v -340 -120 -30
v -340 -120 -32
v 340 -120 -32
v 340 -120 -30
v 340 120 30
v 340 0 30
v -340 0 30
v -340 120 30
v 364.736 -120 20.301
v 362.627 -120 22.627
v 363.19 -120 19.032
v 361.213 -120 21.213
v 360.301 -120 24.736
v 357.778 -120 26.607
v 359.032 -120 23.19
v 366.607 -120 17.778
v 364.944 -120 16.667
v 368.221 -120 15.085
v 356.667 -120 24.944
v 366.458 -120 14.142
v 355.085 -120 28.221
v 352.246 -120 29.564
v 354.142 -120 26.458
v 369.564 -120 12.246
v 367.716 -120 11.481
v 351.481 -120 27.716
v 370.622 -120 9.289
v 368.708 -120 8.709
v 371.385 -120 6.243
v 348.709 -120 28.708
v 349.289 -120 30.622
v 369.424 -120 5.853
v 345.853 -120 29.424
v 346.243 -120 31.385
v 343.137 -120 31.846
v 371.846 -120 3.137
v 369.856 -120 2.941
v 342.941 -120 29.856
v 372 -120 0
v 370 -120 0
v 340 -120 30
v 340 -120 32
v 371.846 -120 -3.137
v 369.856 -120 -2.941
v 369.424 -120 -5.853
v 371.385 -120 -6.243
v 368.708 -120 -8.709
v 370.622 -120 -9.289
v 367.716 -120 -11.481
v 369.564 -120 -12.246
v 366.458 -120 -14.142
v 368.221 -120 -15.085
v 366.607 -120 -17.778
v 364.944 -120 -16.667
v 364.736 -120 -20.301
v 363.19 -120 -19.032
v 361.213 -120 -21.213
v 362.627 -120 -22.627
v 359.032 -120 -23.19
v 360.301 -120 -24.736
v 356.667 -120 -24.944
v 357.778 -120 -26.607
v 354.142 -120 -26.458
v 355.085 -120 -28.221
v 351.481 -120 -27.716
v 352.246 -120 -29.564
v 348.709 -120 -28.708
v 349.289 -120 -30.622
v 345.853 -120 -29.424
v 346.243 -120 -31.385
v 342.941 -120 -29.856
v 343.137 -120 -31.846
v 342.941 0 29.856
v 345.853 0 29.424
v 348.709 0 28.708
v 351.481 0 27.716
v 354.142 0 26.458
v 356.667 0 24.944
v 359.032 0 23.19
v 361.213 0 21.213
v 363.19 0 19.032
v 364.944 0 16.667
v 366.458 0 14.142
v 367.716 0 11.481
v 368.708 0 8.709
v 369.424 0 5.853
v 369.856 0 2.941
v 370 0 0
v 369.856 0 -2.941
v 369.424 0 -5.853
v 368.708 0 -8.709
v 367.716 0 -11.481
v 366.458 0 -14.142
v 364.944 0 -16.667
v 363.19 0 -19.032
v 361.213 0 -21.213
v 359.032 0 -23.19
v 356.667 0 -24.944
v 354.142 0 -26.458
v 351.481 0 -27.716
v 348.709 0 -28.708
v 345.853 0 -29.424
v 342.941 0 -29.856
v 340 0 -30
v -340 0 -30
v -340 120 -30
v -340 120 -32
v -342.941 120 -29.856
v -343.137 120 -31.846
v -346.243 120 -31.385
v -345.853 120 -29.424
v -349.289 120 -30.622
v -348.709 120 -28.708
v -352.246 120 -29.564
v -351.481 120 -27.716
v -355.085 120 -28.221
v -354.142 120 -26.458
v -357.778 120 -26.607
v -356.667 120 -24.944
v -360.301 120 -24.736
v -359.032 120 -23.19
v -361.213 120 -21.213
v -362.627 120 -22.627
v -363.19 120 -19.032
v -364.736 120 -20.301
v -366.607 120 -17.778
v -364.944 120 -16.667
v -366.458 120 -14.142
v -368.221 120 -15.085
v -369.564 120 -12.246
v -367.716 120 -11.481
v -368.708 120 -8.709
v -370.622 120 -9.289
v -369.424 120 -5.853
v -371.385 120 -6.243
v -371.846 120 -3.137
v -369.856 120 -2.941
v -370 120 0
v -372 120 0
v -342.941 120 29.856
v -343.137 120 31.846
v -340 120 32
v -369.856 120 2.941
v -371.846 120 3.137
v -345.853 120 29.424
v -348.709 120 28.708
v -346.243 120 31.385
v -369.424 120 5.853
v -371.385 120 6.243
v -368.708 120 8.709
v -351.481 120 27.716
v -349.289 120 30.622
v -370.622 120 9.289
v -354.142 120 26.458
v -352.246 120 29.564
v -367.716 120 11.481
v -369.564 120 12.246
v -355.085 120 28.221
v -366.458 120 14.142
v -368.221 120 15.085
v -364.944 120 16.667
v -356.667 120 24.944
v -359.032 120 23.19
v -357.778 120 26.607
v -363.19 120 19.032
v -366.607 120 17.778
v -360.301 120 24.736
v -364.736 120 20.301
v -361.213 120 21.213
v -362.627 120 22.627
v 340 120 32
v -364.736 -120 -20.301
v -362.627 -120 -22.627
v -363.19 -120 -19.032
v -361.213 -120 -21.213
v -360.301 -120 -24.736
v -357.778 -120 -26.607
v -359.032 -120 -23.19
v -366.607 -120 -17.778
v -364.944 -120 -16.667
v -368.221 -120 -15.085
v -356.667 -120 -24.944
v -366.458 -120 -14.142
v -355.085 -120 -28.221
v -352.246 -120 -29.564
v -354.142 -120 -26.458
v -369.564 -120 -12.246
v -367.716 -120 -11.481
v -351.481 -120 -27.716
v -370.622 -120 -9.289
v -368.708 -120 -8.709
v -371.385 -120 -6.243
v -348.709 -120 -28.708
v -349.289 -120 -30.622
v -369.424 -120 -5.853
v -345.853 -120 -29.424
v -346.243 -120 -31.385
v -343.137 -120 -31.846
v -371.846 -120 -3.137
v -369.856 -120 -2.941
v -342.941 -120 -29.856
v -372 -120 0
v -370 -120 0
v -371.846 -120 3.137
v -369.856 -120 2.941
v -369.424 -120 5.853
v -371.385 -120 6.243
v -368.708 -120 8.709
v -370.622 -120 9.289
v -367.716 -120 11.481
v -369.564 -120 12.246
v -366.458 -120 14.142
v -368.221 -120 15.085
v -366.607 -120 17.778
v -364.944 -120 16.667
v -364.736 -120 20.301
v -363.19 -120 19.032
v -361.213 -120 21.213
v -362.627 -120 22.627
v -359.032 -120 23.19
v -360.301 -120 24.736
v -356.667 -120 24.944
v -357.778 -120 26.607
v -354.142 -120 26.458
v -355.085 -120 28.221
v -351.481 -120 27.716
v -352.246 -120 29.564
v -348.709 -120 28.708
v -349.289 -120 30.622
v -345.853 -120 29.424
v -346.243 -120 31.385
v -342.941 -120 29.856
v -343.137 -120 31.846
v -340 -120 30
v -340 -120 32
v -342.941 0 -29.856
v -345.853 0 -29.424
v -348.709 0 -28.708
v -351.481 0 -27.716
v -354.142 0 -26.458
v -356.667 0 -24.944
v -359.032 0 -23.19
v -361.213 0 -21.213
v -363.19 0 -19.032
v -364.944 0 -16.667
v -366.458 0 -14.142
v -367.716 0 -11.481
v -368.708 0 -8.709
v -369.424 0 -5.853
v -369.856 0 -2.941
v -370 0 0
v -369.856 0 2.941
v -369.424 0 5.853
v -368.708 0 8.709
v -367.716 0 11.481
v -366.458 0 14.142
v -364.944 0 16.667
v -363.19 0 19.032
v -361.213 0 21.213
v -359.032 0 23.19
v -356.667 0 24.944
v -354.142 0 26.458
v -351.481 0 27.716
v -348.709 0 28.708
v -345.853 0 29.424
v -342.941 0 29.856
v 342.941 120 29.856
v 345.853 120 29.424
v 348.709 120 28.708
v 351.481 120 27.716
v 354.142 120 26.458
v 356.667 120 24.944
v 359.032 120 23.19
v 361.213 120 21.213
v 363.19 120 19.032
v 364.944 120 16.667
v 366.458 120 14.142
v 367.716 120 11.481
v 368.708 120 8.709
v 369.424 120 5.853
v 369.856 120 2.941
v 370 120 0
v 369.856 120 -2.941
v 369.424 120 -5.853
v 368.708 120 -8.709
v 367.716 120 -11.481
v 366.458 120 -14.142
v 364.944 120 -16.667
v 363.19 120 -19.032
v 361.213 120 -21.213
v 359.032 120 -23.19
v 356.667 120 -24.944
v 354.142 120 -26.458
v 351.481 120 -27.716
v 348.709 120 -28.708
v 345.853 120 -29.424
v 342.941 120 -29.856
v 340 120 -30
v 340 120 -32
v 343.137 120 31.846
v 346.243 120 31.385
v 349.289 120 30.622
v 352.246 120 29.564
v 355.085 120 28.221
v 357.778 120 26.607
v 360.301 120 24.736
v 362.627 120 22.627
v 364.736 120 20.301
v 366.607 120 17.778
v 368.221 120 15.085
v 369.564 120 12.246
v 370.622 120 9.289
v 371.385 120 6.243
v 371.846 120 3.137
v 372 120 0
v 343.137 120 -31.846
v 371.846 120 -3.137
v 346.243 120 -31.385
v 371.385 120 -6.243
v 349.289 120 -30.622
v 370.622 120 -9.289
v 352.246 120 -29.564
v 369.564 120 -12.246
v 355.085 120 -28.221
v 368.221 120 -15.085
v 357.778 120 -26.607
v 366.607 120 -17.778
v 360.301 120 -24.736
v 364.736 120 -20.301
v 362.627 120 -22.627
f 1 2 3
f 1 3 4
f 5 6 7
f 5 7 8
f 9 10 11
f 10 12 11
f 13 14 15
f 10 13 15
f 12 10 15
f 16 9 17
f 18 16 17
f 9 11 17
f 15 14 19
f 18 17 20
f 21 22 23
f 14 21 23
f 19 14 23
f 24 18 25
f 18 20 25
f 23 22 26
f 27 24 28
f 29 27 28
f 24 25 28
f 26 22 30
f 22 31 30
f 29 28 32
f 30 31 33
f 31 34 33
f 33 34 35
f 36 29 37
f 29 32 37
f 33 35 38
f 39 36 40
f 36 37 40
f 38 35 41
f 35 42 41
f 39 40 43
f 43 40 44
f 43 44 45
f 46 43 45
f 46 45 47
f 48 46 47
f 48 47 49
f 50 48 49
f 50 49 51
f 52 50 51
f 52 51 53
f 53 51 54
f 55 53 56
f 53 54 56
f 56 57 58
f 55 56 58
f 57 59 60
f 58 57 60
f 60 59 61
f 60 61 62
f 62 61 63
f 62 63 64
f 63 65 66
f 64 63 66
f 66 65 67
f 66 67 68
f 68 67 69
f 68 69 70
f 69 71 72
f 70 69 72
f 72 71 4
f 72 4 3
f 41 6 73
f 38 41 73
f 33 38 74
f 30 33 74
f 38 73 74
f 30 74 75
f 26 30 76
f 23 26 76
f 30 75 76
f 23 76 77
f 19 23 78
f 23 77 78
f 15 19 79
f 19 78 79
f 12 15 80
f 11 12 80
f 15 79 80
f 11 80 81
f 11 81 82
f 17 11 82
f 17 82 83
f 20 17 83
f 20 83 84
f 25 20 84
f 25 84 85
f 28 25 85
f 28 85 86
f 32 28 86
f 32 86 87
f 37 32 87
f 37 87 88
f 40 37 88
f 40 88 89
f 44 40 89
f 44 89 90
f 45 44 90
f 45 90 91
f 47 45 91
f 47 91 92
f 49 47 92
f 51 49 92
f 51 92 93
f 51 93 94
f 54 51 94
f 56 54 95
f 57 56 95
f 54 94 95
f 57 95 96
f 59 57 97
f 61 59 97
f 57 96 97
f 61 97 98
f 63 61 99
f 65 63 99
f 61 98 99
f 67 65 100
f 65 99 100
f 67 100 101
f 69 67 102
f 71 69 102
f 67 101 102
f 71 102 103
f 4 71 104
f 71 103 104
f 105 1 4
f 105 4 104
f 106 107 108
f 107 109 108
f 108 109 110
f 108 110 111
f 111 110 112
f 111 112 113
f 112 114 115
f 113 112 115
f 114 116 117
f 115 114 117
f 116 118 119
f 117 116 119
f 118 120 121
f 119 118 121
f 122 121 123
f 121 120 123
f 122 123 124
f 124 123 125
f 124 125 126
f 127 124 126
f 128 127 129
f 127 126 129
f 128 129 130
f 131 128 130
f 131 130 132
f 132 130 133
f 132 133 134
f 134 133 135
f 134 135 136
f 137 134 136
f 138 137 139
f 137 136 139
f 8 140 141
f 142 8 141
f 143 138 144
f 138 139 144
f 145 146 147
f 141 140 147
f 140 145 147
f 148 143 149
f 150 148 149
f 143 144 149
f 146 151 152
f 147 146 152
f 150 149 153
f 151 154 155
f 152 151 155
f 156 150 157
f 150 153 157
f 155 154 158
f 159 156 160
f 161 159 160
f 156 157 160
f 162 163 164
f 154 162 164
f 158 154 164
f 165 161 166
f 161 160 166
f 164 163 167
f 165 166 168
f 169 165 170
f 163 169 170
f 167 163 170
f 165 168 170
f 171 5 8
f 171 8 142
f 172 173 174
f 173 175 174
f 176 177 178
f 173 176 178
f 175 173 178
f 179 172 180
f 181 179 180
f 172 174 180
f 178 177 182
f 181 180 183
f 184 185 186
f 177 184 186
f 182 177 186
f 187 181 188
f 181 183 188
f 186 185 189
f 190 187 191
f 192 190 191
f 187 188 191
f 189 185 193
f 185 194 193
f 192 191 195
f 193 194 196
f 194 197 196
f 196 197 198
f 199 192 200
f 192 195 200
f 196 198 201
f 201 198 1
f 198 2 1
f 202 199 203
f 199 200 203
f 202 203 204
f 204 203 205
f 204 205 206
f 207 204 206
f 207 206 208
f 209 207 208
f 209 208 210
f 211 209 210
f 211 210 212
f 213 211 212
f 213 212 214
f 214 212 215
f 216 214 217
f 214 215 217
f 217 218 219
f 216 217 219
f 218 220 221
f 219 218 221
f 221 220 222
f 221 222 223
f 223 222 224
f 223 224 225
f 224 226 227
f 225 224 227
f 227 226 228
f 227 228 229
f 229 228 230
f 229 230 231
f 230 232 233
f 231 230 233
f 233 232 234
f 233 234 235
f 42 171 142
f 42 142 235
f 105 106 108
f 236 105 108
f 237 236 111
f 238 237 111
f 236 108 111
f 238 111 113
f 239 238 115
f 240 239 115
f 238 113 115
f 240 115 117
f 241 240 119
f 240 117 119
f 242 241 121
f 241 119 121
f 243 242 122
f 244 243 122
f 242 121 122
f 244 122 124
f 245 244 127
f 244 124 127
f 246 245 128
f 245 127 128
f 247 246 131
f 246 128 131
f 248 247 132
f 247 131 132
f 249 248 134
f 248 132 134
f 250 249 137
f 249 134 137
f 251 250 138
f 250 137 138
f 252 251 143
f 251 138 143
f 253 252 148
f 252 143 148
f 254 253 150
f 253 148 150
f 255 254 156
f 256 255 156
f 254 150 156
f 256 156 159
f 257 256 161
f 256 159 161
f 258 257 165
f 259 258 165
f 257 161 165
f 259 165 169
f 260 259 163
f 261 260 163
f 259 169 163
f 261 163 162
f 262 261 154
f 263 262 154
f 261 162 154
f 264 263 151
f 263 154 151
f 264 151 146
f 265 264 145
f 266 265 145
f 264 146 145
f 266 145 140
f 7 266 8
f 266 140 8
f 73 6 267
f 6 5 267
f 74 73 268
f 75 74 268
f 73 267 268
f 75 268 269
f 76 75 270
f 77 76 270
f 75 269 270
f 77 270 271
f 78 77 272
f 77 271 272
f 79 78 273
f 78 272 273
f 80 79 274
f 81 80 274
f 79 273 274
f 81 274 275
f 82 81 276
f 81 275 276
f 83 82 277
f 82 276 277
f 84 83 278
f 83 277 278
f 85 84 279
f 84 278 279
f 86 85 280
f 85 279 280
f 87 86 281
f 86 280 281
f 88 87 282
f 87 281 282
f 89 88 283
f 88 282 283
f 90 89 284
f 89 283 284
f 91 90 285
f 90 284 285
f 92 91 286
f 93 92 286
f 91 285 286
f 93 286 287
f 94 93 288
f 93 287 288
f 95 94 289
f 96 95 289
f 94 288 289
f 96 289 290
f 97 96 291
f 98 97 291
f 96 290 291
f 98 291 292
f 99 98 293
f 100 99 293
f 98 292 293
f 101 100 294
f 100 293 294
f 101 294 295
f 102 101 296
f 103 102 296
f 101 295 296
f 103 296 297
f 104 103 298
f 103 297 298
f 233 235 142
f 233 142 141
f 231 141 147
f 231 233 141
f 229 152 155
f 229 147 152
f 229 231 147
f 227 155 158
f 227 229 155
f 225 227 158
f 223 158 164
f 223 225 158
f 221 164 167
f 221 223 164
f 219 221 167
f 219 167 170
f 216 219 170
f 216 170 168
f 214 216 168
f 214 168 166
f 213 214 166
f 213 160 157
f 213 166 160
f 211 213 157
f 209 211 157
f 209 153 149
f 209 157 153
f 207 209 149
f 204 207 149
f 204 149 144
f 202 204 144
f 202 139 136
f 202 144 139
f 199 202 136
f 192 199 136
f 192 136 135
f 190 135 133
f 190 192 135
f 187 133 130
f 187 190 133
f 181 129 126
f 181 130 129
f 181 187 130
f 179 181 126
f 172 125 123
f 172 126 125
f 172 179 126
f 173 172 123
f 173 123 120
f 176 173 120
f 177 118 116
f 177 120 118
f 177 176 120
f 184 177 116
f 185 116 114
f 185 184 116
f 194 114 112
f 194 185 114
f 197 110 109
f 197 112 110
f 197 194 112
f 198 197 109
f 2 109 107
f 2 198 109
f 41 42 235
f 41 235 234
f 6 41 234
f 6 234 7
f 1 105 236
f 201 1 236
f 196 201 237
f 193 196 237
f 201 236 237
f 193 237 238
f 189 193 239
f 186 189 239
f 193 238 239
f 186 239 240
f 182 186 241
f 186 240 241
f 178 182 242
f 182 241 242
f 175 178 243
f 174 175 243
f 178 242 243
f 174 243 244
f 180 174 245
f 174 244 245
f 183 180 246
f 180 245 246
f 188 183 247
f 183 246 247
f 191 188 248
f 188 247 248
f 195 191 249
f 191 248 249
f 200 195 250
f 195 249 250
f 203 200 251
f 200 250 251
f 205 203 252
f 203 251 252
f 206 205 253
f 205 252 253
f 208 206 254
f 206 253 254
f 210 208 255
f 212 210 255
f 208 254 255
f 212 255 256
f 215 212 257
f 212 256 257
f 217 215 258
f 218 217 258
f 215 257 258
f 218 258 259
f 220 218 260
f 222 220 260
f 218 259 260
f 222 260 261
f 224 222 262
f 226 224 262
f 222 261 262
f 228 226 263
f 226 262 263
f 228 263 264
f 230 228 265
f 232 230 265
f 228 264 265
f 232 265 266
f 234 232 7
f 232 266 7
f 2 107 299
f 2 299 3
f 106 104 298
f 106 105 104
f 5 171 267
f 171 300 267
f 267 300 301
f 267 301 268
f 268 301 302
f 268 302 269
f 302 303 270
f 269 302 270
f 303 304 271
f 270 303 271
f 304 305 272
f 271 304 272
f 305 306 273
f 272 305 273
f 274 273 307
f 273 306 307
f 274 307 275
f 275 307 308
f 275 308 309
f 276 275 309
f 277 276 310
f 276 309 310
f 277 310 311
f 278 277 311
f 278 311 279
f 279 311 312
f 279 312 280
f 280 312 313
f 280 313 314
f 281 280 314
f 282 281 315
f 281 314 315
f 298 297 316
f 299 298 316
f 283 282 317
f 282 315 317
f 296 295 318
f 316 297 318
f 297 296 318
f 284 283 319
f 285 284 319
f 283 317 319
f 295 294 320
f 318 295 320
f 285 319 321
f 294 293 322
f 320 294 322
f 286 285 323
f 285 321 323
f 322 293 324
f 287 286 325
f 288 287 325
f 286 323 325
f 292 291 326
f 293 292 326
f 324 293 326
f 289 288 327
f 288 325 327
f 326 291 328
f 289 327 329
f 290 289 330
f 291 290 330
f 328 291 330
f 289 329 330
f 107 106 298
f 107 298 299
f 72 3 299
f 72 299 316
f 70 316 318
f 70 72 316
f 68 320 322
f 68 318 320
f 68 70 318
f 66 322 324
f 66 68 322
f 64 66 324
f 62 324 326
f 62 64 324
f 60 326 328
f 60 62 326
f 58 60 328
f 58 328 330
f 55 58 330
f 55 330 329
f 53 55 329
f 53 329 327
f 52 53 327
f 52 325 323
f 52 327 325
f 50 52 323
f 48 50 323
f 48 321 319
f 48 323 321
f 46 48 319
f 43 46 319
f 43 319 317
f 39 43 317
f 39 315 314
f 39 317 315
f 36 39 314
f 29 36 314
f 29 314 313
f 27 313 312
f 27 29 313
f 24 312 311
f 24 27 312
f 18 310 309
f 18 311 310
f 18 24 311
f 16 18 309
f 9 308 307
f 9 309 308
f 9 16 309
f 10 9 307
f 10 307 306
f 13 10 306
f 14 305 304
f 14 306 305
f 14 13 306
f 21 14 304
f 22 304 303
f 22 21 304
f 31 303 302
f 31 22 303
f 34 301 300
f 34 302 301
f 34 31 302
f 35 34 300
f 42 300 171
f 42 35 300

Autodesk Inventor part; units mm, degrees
ref_plane "YZ Plane" through (0, 0, 0) normal (1, 0, 0) x (0, 1, 0)
ref_plane "XZ Plane" through (0, 0, 0) normal (0, 1, 0) x (-1, 0, 0)
sketch "Sketch1" plane through (0, 0, 0) normal (0, 1, 0) x (-1, 0, 0)
  line L0 (370, 0) -> (-370, 0) construction
  line L1 (340, 30) -> (-340, 30)
  line L2 (-340, -30) -> (340, -30)
  arc A0 (340, -30) -> (340, 30) centre (340, 0) ccw
  arc A1 (-340, 30) -> (-340, -30) centre (-340, 0) ccw
  point P0 (0, 0)
  point P1 (0, 0)
  point P2 (-370, 0)
  point P3 (370, 0)
  dimension "d2" = 60
  dimension "d7" = 680
ref_plane "Work Plane1" through (-340, 0, -30) normal (-1, 0, 0) x (0, -1, 0)
sketch "Sketch2" plane through (-340, 0, -30) normal (-1, 0, 0) x (0, -1, 0)
  line L0 (-120, 0) -> (120, 0)
  line L1 (120, 0) -> (120, -2)
  line L2 (120, -2) -> (-120, -2)
  line L3 (-120, -2) -> (-120, 0)
  line L4 (-120, 0) -> (120, -2) construction
  line L5 (120, 0) -> (-120, -2) construction
  line L6 (0, 60) -> (0, 0) projected
  point P0 (0, 30)
  dimension "d3" = 240
  dimension "d4" = 2
sweep "Sweep1" add profiles "Sketch2" path "Sketch1"
properties part number "HCMUTE-CDT23-BELT_BTC" material "PVC, Unplasticized"
